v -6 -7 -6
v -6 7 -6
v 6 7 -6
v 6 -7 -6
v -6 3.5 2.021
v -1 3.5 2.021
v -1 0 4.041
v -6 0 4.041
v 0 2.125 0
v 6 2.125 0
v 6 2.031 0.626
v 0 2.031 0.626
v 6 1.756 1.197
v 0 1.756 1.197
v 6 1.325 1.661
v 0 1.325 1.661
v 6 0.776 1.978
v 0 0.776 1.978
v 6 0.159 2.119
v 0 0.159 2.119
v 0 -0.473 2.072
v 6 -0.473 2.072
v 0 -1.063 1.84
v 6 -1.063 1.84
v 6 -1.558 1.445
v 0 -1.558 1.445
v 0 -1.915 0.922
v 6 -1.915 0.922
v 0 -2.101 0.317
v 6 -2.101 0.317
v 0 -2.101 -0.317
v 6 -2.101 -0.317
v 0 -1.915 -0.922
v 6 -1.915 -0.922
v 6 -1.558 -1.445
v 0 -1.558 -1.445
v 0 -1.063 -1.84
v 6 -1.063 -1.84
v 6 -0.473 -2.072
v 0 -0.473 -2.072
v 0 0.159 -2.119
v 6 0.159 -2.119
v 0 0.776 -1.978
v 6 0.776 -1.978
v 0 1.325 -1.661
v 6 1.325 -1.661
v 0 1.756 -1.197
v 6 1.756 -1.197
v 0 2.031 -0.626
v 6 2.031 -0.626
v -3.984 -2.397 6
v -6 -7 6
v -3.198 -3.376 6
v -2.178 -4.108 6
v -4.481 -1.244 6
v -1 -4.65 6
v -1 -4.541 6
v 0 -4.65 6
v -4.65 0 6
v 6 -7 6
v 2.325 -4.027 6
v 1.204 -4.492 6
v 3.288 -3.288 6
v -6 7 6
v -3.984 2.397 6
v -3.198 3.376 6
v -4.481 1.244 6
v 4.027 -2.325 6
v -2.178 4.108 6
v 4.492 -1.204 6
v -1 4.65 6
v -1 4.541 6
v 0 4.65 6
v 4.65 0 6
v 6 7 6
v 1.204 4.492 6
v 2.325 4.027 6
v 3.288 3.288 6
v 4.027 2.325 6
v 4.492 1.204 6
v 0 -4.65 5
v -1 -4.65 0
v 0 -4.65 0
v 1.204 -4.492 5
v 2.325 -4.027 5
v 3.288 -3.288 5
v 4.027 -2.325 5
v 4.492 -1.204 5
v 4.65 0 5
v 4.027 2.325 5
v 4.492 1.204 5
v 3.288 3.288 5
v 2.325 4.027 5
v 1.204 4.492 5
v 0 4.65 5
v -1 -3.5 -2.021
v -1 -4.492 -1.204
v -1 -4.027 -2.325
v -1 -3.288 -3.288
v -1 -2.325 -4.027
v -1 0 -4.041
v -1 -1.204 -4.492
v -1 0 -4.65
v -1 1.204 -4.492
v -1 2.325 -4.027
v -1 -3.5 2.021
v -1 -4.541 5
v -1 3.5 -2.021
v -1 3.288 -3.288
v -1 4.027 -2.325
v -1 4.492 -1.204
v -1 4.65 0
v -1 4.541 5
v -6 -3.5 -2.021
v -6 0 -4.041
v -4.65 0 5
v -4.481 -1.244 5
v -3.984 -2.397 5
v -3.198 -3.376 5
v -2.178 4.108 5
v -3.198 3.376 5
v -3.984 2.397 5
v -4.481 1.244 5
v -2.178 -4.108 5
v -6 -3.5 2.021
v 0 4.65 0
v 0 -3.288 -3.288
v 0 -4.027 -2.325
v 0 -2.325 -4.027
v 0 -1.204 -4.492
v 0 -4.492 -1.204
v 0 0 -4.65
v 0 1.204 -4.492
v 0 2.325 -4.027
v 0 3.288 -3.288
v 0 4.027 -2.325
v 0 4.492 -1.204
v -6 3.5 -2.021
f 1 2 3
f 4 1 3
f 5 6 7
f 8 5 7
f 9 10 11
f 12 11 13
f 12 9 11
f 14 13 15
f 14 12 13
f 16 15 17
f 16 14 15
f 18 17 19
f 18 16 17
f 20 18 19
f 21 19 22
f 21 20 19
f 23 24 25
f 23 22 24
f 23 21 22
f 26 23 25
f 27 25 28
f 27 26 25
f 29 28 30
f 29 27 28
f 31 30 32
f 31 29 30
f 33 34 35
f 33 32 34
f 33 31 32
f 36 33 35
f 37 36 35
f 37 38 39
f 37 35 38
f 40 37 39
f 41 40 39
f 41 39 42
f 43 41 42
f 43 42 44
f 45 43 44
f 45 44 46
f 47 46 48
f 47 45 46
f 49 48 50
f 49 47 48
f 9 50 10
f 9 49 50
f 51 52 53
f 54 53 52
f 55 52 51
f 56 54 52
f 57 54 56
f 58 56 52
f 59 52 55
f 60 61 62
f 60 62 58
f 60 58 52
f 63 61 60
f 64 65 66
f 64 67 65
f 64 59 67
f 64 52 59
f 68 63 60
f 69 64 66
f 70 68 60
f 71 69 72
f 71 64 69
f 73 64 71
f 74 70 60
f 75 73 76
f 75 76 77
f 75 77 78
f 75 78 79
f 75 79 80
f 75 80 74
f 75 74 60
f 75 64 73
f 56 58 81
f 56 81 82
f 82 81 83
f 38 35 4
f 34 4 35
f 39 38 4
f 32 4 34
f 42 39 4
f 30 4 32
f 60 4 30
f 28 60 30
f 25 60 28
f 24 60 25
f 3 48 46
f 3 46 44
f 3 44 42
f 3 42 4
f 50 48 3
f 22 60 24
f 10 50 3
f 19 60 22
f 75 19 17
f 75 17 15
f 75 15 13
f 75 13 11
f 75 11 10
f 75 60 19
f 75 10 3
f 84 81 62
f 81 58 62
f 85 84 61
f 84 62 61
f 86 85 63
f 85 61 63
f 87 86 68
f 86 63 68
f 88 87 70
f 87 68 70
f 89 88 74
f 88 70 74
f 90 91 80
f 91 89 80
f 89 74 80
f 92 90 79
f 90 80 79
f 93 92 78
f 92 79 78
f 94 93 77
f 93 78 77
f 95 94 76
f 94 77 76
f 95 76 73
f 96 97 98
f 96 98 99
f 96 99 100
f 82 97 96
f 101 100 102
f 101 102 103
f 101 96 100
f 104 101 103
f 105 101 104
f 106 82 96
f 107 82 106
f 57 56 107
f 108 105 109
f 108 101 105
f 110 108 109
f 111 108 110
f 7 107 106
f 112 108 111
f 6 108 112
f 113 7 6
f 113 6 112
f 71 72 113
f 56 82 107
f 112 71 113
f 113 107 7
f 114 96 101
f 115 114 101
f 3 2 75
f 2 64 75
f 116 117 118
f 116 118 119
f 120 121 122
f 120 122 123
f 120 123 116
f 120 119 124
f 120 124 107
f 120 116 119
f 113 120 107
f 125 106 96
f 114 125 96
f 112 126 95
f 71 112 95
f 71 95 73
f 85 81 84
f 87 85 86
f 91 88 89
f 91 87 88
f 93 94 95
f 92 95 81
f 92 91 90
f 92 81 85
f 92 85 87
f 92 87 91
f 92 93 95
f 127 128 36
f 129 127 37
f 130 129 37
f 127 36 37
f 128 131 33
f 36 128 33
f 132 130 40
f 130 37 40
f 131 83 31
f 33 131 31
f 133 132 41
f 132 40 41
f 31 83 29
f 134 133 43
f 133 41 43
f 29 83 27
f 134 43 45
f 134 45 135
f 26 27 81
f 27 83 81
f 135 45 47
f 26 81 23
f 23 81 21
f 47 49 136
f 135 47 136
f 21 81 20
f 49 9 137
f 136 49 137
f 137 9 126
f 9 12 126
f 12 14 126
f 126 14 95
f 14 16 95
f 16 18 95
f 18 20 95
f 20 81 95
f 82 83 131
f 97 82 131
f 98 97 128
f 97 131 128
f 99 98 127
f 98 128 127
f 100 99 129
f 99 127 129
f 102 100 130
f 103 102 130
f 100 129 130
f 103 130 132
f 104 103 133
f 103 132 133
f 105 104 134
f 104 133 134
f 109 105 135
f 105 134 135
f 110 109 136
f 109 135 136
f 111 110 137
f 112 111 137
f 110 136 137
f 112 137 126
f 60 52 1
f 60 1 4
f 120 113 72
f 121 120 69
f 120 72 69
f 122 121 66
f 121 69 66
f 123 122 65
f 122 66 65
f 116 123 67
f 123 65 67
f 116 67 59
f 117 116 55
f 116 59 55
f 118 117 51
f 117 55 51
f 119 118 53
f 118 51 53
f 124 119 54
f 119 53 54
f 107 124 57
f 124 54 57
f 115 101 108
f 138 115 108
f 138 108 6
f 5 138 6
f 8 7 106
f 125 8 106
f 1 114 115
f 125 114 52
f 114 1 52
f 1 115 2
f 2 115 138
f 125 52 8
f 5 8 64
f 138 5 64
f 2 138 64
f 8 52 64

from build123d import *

# Parameters (mm, degrees)
SKETCH052_W          = 12
SKETCH052_H          = 14
PAD011_DEPTH         = 6
POCKET024_DEPTH      = 1
POCKET025_DEPTH      = 5.001
SKETCH055_R          = 2.125
POCKET026_DEPTH      = 6.001
POCKET026_DEPTH_BACK = 6.001
SKETCH056_R          = 4.65
POCKET027_DEPTH      = 1


with BuildPart() as part:
    # Sketch052 → Pad011 (new body, symmetric)
    with BuildSketch(Plane.XY):
        Rectangle(SKETCH052_W, SKETCH052_H)
    extrude(amount=PAD011_DEPTH, both=True)

    # Sketch053 → Pocket024 (cut)
    with BuildSketch(Plane.YZ):
        with BuildLine():
            ThreePointArc((-4.65, 0), (0, -4.65), (4.65, 0))
            Line((4.65, 0), (4.65, 10))
            Line((4.65, 10), (-4.65, 10))
            Line((-4.65, 10), (-4.65, 0))
        make_face()
    extrude(amount=-POCKET024_DEPTH, mode=Mode.SUBTRACT)

    # Sketch054 → Pocket025 (cut, through all)
    with BuildSketch(Plane.YZ.offset(-1)):
        Polygon((0, 4.0414518843), (-3.5, 2.0207259422), (-3.5, -2.0207259422), (0, -4.0414518843), (3.5, -2.0207259422), (3.5, 2.0207259422), align=None)
    extrude(amount=-POCKET025_DEPTH, mode=Mode.SUBTRACT)

    # Sketch055 → Pocket026 (cut, two sides)
    with BuildSketch(Plane.YZ) as pocket026_sk:
        Circle(SKETCH055_R)
    extrude(amount=-POCKET026_DEPTH, mode=Mode.SUBTRACT)
    extrude(pocket026_sk.sketch, amount=POCKET026_DEPTH_BACK, mode=Mode.SUBTRACT)

    # Sketch056 → Pocket027 (cut)
    with BuildSketch(Plane.XY.offset(6)):
        Circle(SKETCH056_R)
    extrude(amount=-POCKET027_DEPTH, mode=Mode.SUBTRACT)


solid = part.part
